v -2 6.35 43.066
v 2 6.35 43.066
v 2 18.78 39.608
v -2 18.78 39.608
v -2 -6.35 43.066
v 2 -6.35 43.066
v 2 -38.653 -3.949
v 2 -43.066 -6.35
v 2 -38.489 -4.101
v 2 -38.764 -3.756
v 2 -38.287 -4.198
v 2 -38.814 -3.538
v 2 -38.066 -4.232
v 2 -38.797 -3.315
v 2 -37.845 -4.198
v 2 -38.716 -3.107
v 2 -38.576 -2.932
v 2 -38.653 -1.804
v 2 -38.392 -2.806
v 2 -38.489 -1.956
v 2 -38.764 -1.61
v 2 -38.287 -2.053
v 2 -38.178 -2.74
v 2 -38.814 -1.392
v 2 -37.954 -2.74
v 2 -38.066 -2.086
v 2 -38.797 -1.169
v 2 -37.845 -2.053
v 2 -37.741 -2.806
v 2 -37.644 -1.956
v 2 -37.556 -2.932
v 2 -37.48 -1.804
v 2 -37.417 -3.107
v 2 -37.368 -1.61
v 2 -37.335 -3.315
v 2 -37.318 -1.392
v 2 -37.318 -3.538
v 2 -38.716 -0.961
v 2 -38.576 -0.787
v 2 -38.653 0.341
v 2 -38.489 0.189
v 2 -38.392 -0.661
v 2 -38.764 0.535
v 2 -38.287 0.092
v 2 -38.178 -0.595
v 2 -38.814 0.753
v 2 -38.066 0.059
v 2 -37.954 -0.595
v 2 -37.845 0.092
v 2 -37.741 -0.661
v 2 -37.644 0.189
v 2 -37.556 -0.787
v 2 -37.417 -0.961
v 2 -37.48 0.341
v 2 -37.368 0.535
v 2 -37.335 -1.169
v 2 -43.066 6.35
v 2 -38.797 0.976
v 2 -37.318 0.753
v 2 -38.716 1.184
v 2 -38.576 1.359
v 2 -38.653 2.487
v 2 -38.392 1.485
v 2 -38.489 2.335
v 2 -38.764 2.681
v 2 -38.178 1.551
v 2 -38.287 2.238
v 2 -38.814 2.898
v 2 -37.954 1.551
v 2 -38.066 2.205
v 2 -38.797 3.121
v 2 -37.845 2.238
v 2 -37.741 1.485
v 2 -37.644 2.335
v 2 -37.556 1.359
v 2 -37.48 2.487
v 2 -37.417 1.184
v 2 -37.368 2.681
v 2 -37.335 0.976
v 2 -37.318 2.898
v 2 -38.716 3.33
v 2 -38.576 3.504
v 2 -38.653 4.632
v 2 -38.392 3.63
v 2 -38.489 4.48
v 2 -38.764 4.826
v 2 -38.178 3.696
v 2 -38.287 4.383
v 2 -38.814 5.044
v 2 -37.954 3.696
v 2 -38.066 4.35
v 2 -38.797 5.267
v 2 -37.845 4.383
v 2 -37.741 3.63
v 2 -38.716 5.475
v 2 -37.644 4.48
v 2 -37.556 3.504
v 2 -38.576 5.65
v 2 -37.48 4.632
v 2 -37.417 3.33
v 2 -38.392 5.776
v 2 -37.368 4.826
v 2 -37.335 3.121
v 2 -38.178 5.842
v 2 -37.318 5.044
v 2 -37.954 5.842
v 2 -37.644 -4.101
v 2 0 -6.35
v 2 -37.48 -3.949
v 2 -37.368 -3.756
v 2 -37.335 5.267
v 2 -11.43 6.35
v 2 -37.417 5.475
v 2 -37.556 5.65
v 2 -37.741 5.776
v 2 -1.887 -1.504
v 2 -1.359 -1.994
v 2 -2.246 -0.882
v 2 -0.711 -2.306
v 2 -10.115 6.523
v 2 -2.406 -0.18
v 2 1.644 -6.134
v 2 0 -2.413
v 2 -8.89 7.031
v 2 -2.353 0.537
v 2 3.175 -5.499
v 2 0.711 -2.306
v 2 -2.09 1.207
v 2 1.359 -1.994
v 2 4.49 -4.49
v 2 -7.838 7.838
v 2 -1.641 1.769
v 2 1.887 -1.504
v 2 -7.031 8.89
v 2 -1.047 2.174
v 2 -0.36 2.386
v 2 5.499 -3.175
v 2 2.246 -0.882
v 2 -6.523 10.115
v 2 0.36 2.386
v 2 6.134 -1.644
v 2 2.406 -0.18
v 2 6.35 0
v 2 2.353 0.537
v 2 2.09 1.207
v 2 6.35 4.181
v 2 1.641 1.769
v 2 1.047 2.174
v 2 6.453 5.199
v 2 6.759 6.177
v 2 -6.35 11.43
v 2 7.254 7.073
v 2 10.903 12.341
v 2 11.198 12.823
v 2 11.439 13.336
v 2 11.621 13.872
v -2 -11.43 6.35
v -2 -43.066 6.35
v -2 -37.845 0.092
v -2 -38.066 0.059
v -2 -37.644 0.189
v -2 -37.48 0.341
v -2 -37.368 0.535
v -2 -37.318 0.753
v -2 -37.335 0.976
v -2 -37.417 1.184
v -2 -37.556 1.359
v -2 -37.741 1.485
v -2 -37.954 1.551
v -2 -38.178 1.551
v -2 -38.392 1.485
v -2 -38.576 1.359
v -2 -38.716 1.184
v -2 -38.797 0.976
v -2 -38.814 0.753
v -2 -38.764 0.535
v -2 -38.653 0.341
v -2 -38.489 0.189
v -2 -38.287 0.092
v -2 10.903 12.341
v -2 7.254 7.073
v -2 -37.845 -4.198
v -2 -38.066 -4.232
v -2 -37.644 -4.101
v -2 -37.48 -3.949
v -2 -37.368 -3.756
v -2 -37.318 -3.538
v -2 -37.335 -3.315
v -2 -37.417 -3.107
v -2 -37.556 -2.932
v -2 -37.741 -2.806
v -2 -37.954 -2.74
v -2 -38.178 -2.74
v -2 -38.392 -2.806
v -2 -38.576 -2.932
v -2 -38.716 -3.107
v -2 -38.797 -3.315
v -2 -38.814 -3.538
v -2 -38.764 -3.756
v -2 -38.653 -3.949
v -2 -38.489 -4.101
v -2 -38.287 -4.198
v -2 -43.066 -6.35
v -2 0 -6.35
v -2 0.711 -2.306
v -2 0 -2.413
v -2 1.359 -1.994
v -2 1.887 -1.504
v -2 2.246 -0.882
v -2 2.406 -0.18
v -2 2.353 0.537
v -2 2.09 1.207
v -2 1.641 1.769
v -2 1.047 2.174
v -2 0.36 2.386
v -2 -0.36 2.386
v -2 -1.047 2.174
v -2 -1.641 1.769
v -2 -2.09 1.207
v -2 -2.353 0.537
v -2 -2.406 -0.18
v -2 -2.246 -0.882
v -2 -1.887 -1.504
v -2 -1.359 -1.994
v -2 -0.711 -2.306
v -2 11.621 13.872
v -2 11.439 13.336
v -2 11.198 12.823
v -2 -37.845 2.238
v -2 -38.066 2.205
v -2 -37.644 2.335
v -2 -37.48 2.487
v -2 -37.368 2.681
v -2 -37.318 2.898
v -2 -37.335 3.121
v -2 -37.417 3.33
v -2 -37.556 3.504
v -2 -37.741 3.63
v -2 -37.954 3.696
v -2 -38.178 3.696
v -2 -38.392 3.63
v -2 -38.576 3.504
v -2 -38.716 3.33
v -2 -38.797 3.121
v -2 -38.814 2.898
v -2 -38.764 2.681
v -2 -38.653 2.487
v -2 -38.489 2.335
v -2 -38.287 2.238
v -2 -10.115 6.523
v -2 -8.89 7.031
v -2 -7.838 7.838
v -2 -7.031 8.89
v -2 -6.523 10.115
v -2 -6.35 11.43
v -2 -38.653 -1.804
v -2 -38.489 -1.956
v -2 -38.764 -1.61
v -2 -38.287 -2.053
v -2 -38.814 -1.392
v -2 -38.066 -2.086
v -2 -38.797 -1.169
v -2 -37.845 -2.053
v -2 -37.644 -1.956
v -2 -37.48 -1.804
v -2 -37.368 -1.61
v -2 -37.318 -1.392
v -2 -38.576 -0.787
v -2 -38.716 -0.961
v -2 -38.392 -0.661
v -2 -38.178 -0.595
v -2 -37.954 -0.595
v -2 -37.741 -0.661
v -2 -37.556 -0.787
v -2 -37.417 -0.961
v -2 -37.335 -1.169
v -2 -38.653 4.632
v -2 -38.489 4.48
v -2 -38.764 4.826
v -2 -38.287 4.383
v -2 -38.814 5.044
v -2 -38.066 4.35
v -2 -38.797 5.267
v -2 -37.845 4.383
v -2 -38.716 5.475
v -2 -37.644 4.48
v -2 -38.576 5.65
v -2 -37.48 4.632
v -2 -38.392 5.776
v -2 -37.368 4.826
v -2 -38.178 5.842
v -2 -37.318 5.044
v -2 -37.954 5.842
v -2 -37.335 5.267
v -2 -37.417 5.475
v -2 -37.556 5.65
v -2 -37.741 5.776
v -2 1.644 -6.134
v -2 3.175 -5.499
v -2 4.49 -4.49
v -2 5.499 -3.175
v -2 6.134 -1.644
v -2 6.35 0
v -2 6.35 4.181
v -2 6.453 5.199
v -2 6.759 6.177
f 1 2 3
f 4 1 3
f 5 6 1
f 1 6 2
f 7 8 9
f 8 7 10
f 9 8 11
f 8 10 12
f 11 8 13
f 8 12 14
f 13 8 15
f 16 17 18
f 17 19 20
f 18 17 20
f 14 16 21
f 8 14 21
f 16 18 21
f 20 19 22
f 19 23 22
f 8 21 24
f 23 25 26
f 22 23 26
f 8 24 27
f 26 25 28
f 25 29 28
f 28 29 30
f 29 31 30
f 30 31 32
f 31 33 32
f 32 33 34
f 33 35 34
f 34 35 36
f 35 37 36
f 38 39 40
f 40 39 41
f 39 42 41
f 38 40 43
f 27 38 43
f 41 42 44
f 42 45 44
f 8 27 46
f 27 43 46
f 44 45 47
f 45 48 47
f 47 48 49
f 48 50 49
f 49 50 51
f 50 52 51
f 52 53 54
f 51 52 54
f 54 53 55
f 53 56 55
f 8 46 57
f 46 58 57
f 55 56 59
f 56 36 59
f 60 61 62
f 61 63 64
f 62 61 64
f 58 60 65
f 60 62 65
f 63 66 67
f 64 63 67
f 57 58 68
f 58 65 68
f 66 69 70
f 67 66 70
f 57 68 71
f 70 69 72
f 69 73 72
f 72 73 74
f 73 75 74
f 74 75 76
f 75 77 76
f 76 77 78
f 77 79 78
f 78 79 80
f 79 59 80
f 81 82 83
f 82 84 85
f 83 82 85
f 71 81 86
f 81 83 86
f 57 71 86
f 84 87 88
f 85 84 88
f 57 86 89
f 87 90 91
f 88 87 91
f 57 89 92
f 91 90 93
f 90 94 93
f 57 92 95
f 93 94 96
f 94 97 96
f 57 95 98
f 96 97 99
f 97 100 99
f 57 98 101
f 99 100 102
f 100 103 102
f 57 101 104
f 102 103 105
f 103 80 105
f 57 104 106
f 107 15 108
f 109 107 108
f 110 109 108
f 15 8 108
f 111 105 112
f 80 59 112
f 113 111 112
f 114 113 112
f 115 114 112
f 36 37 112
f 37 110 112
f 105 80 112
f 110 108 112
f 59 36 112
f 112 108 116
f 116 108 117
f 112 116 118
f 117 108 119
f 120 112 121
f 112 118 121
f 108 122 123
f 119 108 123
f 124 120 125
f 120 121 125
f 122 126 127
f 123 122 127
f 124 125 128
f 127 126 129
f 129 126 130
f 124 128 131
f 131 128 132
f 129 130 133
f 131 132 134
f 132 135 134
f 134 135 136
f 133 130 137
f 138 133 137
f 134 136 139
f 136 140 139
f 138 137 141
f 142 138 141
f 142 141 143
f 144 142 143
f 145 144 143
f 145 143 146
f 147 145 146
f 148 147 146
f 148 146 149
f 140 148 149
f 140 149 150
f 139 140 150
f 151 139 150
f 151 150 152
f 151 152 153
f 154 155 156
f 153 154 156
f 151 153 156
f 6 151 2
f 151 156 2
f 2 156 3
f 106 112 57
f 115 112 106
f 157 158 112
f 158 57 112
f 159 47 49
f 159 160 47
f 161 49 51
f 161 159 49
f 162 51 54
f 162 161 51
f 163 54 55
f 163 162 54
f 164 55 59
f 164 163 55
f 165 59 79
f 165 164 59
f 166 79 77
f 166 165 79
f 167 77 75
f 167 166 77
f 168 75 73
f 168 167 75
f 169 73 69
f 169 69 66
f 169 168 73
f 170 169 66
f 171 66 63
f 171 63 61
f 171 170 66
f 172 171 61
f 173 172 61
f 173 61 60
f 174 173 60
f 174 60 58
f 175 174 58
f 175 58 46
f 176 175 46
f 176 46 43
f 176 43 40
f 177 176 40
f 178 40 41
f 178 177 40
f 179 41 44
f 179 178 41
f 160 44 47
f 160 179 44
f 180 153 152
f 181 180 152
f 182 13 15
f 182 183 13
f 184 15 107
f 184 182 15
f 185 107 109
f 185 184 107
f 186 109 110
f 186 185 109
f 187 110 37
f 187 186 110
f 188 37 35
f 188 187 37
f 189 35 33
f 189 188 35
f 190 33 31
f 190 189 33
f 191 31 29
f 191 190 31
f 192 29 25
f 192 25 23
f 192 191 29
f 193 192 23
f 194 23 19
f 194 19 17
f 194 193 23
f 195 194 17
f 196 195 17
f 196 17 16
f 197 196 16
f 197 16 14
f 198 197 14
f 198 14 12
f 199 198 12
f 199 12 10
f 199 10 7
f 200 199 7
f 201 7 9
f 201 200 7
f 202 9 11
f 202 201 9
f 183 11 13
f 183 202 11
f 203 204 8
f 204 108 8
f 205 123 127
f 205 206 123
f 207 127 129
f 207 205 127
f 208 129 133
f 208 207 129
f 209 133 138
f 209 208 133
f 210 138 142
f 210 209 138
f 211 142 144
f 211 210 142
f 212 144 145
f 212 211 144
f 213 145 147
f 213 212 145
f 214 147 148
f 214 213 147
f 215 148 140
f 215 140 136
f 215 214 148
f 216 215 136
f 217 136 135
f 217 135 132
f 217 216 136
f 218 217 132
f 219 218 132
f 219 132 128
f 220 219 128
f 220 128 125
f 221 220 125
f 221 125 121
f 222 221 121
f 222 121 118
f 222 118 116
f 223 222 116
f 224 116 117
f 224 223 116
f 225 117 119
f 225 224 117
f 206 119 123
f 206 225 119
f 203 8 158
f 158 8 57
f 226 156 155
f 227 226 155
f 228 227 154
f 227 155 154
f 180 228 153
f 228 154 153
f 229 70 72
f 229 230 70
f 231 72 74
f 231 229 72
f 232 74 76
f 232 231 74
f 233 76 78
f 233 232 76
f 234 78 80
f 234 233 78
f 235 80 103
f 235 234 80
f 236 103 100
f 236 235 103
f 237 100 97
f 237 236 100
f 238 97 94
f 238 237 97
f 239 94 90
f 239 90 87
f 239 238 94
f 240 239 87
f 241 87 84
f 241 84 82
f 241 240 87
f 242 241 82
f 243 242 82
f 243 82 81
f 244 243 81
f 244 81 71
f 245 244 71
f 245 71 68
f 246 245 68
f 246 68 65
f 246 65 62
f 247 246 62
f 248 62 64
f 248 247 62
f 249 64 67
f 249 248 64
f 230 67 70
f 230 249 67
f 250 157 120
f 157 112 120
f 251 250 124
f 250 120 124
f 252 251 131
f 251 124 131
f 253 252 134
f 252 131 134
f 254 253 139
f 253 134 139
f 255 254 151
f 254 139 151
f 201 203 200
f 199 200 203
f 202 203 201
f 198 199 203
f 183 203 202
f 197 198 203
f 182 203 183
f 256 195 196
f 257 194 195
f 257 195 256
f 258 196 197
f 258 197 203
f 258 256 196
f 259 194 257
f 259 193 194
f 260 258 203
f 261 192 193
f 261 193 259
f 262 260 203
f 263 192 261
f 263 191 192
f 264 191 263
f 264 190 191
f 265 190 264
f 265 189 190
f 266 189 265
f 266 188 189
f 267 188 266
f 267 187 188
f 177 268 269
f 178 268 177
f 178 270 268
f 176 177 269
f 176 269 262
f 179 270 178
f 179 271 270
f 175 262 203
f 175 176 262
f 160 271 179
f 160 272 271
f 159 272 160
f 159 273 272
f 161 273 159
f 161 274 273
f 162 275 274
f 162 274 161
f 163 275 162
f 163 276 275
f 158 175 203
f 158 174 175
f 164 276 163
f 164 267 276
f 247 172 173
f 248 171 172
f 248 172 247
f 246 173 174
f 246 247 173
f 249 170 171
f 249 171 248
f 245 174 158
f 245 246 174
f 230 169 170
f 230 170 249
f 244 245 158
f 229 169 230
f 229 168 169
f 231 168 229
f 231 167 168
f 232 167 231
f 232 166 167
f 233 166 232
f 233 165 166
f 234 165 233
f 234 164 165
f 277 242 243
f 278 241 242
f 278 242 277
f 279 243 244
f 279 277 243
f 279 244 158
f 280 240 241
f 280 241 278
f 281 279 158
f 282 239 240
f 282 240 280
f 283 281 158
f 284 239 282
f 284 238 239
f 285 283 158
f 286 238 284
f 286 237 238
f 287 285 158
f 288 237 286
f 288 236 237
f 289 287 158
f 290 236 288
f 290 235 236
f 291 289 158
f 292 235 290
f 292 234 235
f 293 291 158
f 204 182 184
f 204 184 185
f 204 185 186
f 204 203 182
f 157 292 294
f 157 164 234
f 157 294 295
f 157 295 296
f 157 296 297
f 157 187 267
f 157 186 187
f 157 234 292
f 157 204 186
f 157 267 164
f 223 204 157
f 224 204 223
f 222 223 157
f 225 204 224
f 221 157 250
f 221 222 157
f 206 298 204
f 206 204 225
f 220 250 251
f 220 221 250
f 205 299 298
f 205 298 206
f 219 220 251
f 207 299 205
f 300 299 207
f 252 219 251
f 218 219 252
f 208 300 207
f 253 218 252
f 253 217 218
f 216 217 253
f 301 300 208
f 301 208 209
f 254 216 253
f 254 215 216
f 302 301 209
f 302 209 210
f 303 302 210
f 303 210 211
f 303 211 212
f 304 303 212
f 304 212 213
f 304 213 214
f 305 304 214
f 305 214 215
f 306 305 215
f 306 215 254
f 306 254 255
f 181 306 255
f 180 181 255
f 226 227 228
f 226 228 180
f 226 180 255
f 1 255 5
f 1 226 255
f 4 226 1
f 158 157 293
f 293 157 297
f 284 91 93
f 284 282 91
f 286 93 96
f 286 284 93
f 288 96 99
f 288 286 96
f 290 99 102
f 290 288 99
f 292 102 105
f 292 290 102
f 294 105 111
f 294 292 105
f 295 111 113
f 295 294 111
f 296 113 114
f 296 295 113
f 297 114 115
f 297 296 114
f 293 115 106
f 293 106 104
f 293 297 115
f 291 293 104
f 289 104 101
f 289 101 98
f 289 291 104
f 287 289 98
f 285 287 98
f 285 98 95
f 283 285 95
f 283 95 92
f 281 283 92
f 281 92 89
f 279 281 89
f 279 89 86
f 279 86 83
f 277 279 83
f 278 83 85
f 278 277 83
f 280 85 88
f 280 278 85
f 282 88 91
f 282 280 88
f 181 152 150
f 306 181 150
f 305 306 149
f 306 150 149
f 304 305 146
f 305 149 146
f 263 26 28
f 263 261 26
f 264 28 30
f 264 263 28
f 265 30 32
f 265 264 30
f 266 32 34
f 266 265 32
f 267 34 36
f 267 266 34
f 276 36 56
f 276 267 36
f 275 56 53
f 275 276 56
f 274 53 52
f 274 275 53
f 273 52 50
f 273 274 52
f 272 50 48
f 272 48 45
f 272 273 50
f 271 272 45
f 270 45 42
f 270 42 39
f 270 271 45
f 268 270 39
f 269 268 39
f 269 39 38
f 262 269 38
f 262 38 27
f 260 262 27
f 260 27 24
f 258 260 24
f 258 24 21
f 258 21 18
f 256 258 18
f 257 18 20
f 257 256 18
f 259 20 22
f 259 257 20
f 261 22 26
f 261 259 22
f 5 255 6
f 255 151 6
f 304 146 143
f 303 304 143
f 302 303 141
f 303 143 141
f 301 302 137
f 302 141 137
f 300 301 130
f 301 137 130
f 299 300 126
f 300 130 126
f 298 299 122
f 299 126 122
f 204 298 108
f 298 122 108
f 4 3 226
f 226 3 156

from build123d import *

# Parameters (mm, degrees)
SKETCH1_R           = 2.413
SKETCH1_R_2         = 0.75
BOSS_EXTRUDE1_DEPTH = 2


with BuildPart() as part:
    # Sketch1 → Boss-Extrude1 (new, symmetric)
    with BuildSketch(Plane(origin=(0, 0, 0), x_dir=(0, 0, -1), z_dir=(1, 0, 0))):
        with BuildLine():
            Line((-4.180666535, 6.35), (0, 6.35))
            ThreePointArc((0, 6.35), (4.490128061, 4.490128061), (6.35, 0))
            Line((6.35, 0), (6.35, -43.06614877))
            Line((6.35, -43.06614877), (-6.35, -43.06614877))
            Line((-6.35, -43.06614877), (-6.35, -11.43))
            ThreePointArc((-6.35, -11.43), (-7.837897552, -7.837897552), (-11.43, -6.35))
            Line((-11.43, -6.35), (-43.06614877, -6.35))
            Line((-43.06614877, -6.35), (-43.06614877, 6.35))
            Line((-43.06614877, 6.35), (-39.60826893, 18.780106665))
            Line((-39.60826893, 18.780106665), (-13.871980247, 11.620635214))
            ThreePointArc((-13.871980247, 11.620635214), (-13.07637114, 11.325756262), (-12.340940682, 10.902566601))
            Line((-12.340940682, 10.902566601), (-7.073190955, 7.253913018))
            ThreePointArc((-7.073190955, 7.253913018), (-5.695902182, 6.5812413), (-4.180666535, 6.35))
        make_face()
        Circle(SKETCH1_R, mode=Mode.SUBTRACT)
        with Locations((-5.1, -38.06614877)):
            Circle(SKETCH1_R_2, mode=Mode.SUBTRACT)
        with Locations((-2.954545455, -38.06614877)):
            Circle(SKETCH1_R_2, mode=Mode.SUBTRACT)
        with Locations((-0.809090909, -38.06614877)):
            Circle(SKETCH1_R_2, mode=Mode.SUBTRACT)
        with Locations((1.336363636, -38.06614877)):
            Circle(SKETCH1_R_2, mode=Mode.SUBTRACT)
        with Locations((3.481818182, -38.06614877)):
            Circle(SKETCH1_R_2, mode=Mode.SUBTRACT)
    extrude(amount=BOSS_EXTRUDE1_DEPTH, both=True)


solid = part.part
